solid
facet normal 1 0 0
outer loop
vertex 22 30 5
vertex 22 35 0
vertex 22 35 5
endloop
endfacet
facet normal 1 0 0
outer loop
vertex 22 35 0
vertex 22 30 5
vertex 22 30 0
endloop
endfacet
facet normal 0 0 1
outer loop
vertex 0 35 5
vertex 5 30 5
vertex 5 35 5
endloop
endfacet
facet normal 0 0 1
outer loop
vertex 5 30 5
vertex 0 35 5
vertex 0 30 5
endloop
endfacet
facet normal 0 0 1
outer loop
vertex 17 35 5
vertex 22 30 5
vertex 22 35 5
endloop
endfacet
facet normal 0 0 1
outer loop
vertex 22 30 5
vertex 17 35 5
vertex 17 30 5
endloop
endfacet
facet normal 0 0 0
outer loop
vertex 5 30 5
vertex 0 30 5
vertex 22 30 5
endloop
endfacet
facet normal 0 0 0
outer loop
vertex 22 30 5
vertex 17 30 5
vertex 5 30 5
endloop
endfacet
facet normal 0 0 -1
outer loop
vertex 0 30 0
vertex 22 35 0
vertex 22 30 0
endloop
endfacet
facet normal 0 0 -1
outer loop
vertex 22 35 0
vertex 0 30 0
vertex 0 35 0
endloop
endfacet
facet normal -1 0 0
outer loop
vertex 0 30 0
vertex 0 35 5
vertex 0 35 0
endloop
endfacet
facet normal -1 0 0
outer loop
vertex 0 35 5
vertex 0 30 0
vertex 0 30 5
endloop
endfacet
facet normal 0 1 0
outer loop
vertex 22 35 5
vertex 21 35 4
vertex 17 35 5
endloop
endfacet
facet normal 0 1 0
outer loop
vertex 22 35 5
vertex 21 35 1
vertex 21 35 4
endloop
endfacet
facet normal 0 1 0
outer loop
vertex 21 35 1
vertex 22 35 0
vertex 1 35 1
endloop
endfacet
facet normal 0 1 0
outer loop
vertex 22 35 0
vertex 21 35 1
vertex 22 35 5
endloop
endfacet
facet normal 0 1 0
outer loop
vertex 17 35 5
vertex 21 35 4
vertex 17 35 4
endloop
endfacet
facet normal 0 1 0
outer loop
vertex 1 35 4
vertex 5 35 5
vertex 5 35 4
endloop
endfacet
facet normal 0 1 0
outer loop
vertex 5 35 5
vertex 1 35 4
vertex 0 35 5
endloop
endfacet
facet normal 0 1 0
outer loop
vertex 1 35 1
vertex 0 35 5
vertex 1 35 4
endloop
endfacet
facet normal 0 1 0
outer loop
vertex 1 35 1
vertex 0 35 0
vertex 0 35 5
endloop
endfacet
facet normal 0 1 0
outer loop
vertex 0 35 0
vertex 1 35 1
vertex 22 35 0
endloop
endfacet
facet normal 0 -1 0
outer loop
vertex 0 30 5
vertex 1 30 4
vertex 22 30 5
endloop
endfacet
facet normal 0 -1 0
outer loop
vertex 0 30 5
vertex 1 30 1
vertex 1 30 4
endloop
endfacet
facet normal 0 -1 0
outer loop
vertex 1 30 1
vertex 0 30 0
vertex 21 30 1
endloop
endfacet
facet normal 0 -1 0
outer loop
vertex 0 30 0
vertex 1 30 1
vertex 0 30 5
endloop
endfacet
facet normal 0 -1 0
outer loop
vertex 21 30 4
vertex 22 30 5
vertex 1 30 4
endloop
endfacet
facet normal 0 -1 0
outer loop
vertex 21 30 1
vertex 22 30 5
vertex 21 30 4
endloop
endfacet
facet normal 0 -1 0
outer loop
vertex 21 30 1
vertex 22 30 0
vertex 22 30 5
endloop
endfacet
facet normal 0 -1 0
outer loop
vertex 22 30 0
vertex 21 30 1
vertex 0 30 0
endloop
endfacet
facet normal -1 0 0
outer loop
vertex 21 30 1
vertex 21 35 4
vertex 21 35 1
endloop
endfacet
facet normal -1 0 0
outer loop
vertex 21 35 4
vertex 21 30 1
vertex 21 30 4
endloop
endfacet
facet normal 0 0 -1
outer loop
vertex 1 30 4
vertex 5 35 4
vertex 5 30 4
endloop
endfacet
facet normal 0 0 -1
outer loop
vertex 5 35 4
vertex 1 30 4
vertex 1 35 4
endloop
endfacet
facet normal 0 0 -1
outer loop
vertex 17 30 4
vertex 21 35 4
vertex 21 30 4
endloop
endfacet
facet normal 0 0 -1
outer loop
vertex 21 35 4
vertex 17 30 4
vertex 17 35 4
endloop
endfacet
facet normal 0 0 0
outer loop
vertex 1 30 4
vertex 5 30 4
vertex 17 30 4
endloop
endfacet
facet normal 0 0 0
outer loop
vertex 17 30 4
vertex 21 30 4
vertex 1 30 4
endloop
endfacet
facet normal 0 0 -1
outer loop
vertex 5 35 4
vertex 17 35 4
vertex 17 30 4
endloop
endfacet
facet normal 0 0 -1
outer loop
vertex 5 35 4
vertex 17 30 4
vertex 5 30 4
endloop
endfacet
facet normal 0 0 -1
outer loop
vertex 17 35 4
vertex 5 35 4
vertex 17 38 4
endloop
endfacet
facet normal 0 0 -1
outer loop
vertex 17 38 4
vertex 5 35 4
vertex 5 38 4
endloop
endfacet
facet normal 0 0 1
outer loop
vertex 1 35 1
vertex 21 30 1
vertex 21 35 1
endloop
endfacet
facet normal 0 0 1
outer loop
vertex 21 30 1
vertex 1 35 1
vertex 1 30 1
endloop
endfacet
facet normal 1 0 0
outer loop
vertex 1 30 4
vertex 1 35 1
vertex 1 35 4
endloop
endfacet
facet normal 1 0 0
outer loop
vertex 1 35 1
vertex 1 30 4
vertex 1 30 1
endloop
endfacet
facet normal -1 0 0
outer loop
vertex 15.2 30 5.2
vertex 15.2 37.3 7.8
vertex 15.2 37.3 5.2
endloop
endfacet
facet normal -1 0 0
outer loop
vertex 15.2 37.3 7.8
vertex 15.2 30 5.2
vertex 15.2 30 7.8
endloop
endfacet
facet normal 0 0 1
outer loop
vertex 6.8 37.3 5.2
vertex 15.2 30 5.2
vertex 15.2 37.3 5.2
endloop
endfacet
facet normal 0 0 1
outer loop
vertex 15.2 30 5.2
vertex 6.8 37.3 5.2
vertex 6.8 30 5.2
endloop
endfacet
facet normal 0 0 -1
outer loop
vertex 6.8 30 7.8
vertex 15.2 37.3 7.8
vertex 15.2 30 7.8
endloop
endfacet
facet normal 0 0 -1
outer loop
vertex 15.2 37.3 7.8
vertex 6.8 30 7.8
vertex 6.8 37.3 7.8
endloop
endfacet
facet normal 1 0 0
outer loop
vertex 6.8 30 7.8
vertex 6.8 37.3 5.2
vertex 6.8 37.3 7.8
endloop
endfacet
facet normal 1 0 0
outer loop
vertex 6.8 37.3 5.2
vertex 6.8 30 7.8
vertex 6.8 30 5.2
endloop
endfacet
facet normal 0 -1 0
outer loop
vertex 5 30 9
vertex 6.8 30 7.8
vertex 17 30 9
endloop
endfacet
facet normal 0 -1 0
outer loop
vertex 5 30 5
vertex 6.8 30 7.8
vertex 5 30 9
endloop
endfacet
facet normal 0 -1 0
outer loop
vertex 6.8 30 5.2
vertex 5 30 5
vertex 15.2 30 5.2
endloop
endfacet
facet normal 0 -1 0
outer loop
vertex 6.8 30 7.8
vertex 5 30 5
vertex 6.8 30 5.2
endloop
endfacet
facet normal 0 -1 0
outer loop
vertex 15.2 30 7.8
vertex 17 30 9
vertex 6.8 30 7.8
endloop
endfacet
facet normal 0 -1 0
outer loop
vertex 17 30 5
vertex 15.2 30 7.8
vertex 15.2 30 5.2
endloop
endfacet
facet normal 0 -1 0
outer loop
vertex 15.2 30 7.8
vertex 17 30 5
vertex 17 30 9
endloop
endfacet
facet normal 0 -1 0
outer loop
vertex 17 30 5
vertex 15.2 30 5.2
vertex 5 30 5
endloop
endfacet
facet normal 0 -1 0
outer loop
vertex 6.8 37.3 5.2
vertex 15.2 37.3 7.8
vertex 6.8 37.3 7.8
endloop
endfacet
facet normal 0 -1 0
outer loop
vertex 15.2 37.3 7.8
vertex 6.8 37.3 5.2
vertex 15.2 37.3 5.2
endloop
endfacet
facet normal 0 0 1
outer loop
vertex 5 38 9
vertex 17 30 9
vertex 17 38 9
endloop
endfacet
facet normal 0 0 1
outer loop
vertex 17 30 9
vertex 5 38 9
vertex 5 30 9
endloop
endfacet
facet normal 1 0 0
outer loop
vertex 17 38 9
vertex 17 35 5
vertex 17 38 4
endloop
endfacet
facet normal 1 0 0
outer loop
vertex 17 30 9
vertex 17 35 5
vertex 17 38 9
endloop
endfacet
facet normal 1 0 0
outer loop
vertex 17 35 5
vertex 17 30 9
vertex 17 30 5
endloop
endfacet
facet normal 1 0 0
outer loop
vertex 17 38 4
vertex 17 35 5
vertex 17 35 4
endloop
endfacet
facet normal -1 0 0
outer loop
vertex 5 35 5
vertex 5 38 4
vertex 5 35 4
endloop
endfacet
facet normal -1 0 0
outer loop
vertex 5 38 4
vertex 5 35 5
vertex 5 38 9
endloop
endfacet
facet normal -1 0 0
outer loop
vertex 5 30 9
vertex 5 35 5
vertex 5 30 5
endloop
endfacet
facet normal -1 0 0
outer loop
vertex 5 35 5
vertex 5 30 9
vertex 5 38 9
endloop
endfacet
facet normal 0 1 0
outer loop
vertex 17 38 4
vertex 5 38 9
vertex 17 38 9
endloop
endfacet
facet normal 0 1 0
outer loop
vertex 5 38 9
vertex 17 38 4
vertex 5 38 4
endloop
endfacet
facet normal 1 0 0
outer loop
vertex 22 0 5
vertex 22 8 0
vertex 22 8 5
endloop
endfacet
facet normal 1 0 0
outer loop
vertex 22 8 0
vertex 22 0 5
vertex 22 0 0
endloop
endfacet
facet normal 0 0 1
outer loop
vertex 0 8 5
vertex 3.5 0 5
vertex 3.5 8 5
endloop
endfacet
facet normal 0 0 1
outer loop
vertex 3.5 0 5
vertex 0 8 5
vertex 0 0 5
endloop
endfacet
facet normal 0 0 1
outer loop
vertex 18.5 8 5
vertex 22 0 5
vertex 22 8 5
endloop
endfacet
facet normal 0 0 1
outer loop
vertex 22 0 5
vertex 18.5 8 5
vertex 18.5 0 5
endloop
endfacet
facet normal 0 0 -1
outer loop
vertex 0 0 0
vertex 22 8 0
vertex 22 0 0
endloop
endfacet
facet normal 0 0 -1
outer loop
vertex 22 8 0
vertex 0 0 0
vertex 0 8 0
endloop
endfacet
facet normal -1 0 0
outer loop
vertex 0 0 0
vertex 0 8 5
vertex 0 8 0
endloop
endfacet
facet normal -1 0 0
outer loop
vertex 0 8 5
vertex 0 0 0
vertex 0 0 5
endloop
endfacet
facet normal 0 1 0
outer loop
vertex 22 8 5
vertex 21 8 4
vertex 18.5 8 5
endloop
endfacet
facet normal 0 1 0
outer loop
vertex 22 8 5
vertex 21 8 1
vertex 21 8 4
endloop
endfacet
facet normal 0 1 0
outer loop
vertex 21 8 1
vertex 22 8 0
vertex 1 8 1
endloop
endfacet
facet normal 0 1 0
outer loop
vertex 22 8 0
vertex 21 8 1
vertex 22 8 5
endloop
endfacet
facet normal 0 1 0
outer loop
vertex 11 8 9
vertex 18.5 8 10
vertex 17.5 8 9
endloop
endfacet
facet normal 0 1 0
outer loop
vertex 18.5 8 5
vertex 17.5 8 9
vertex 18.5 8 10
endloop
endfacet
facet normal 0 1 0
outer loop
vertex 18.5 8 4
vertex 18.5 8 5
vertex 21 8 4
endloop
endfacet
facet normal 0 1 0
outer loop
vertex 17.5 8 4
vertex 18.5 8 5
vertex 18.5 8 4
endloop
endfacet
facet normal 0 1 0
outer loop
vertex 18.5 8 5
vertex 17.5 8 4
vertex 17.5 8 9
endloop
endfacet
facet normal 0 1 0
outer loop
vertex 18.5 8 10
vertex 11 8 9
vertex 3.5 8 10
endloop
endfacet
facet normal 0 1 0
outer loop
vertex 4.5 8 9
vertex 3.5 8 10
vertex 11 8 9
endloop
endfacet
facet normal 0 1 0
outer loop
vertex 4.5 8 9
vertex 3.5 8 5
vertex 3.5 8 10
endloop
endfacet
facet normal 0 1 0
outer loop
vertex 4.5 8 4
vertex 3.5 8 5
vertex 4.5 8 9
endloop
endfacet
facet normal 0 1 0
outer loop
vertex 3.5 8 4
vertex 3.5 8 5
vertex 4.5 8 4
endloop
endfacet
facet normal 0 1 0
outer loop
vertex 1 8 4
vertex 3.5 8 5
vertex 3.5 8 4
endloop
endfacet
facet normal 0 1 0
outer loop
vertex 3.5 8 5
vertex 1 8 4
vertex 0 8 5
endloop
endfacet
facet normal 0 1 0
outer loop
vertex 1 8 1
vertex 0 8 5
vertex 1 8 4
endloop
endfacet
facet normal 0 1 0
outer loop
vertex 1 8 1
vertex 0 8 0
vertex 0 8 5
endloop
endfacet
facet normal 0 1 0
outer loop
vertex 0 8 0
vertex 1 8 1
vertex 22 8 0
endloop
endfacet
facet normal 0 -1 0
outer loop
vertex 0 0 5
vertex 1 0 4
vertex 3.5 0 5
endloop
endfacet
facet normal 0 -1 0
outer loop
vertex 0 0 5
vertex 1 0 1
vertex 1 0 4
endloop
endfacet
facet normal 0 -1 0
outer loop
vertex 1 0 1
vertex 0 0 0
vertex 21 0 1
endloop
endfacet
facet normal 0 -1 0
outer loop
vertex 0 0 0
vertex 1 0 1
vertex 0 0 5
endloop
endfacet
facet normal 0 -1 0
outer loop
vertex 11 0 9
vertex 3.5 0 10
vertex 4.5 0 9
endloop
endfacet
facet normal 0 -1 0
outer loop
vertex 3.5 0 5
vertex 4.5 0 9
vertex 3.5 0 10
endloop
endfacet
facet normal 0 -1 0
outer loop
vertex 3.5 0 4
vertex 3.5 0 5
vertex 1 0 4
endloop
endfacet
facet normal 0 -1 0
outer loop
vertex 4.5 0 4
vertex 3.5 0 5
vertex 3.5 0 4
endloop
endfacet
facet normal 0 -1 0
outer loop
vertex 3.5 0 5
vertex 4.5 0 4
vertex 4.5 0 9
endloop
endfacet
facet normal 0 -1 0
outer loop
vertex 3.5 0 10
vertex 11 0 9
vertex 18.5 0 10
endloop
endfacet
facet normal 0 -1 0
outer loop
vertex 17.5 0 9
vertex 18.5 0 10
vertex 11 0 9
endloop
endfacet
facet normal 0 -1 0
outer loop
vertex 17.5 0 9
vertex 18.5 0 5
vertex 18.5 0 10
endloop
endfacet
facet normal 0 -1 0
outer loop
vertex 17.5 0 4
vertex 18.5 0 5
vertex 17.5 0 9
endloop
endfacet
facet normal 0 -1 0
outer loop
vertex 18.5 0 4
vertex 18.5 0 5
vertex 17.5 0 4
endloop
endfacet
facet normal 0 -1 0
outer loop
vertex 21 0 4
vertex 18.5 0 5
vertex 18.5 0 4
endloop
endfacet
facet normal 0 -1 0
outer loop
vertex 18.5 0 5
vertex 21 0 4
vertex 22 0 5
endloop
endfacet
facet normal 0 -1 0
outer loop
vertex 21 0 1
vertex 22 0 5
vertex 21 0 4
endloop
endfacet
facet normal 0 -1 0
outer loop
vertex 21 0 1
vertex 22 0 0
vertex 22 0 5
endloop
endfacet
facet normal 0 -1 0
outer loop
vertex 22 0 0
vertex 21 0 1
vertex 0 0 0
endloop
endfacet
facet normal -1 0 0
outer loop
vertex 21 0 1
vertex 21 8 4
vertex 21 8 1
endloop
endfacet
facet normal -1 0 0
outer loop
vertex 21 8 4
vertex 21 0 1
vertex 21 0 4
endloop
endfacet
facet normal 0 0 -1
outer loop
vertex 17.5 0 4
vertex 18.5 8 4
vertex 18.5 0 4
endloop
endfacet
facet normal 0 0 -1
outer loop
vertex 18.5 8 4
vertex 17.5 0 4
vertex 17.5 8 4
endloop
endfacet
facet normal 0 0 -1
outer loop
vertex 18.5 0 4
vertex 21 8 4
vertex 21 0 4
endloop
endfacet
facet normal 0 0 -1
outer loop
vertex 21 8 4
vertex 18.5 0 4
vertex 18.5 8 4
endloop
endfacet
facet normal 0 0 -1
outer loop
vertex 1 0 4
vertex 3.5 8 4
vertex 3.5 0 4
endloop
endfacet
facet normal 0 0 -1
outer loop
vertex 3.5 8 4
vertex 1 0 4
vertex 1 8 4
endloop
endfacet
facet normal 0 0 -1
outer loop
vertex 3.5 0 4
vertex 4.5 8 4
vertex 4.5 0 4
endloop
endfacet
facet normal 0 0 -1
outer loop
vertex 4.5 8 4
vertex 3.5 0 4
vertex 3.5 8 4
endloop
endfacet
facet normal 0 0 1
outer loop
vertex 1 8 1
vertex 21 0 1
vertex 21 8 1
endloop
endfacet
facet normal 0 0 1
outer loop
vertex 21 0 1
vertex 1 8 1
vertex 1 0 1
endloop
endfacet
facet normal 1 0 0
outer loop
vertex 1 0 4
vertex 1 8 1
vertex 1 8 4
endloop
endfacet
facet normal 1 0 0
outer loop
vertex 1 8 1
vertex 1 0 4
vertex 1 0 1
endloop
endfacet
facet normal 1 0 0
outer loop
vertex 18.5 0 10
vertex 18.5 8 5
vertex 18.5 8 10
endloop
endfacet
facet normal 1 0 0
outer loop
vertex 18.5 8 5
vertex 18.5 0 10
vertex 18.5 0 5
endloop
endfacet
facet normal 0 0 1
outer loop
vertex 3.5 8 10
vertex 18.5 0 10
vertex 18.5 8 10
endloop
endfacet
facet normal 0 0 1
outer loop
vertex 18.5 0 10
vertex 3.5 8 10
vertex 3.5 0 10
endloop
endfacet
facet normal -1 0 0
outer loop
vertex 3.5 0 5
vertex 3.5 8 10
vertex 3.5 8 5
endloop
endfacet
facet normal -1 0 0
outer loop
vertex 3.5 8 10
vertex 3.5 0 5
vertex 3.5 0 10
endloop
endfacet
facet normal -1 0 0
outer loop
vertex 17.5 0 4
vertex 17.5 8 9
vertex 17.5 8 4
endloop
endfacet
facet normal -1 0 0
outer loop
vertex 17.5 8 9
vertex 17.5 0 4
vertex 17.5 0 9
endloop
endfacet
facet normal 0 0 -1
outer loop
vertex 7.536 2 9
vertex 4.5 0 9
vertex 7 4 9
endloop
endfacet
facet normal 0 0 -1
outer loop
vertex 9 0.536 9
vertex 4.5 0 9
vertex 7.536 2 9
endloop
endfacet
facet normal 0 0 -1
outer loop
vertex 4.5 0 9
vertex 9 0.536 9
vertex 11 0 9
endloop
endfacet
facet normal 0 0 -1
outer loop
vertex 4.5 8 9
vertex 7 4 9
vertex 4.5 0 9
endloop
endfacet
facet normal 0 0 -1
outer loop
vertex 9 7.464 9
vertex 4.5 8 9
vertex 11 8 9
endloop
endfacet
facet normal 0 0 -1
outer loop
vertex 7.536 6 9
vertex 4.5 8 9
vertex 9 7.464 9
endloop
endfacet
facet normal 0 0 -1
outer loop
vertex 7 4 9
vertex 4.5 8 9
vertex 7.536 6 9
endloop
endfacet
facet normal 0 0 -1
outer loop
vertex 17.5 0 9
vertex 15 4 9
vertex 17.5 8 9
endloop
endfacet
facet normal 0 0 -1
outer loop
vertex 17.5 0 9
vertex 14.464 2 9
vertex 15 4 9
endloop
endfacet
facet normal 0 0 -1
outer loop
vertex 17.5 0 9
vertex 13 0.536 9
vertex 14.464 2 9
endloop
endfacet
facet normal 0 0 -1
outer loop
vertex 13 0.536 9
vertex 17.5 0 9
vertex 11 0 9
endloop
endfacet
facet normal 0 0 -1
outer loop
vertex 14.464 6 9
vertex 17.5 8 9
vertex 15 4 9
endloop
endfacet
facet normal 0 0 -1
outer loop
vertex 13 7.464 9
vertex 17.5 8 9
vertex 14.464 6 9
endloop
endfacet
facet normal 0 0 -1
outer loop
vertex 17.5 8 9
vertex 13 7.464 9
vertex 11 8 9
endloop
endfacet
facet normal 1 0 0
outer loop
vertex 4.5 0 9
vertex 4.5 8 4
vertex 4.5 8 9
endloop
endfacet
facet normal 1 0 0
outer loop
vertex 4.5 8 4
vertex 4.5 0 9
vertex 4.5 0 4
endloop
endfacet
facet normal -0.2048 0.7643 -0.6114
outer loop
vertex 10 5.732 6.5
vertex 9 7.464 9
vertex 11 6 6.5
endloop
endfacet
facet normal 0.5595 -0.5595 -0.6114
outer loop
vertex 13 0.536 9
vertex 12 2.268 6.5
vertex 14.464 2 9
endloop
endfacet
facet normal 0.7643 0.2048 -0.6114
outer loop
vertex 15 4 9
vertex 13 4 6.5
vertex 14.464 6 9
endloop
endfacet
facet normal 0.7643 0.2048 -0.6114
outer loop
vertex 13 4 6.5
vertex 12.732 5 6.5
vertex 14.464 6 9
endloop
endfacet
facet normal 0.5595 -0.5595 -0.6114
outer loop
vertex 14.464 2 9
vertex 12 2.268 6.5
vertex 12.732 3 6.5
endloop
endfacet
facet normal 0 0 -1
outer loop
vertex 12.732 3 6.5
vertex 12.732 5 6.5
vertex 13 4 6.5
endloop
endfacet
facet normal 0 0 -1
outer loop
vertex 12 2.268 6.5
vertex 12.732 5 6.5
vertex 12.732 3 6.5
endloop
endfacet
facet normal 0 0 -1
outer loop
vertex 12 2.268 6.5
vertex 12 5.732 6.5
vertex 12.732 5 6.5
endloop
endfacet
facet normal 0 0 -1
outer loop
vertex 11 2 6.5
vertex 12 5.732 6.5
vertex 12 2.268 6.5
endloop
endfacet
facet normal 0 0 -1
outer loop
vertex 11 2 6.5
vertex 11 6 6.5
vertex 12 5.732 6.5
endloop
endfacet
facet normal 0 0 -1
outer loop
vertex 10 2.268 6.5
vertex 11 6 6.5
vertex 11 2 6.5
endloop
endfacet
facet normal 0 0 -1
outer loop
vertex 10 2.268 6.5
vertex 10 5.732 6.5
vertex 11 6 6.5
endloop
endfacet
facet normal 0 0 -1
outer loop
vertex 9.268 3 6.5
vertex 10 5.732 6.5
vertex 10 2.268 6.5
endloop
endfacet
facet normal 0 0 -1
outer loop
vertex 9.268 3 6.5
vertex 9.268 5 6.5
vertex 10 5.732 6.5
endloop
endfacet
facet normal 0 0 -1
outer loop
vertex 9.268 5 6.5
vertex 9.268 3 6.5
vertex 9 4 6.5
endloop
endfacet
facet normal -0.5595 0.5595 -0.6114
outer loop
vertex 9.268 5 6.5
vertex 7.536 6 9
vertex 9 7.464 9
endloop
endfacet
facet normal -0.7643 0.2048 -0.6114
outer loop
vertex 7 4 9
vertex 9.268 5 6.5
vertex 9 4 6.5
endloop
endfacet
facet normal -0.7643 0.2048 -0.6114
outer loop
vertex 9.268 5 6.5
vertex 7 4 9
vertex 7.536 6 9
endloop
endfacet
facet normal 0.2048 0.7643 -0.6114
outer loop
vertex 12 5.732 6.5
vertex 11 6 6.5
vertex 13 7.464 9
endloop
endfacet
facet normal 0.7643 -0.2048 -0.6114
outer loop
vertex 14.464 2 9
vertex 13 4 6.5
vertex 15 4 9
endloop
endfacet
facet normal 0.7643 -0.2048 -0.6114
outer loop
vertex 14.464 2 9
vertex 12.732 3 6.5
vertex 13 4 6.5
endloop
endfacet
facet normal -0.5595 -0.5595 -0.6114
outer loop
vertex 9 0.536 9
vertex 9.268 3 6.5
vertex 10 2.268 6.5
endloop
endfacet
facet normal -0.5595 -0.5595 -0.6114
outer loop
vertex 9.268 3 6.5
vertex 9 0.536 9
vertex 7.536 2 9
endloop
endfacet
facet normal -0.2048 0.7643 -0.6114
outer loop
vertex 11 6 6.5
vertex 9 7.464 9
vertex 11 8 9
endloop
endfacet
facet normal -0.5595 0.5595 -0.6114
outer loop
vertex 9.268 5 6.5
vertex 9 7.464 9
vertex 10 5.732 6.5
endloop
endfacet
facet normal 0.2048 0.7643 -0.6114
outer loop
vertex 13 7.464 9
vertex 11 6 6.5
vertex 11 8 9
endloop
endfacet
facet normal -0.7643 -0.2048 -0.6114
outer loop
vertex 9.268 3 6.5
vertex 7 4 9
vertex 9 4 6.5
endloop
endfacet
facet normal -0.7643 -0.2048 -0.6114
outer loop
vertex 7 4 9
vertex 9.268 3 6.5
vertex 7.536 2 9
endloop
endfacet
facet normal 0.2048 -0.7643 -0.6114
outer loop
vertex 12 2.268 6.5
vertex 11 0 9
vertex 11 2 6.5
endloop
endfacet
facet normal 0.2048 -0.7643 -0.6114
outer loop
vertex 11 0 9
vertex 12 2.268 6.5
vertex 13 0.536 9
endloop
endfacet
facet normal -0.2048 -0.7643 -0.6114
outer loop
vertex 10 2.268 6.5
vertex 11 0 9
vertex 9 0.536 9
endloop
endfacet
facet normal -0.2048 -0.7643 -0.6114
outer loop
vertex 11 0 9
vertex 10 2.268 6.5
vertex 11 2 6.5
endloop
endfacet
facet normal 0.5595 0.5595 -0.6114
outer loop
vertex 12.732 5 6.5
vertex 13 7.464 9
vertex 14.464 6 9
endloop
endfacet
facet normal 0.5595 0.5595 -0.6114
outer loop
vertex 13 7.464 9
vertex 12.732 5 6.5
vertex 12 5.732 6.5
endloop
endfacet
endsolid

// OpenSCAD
//ykc 5mm deep, 12/13mm wide 
// strap, 3x20mm
$fn=12;
// watch strap
STRAP_WIDTH = 20;
STRAP_DEPTH = 3;

// USB metal part of YKNano
USB_WIDTH = 8.4;
USB_HEIGHT = 2.6;
USB_DEPTH = 7.3;
USB_DIMS = [USB_WIDTH, USB_DEPTH, USB_HEIGHT];
// plastic black part of YKNano
YKN_WIDTH = 13;
YKN_DEPTH = 22;
YKN_HEIGHT = 5;
YKN_DIMS = [YKN_WIDTH, YKN_DEPTH, YKN_HEIGHT];

// CAP = USB cap recepticle
CAP_HEIGHT = 6;
CAP_WIDTH = 12;

// mount band that goes round strap
MOUNT_DEPTH = 1;
MOUNT_LENGTH = 5;
MOUNT_WIDTH = STRAP_WIDTH + 2 * MOUNT_DEPTH;

// hole strap, strap/mount bit with hole fixing
HS_WIDTH = YKN_WIDTH+(2*MOUNT_DEPTH);
HS_LENGTH = 8;

module yubikeynano() {
    // body offset to position USB bit in centre of YKN bit
    body_offset = [(YKN_DIMS[0] - USB_DIMS[0])/2, 0, (YKN_DIMS[2] - USB_DIMS[2])/2];
    translate(body_offset)
        cube(USB_DIMS);
    translate([0,USB_DEPTH,0])
        cube(YKN_DIMS);
}

module cap(){
    difference(){
        cube([CAP_WIDTH,8,YKN_HEIGHT]);
        translate([((CAP_WIDTH-YKN_WIDTH)/2),USB_DEPTH,5])
            rotate(a=[180,0,0])
                yubikeynano();
    }
}

module strap(){
    cube([STRAP_WIDTH,70,STRAP_DEPTH]);
}

module mount(len){
   difference(){
        cube([STRAP_WIDTH+2*MOUNT_DEPTH,len,STRAP_DEPTH+2*MOUNT_DEPTH]);
       translate([MOUNT_DEPTH,0,MOUNT_DEPTH])
        strap();
    }
}

module cap_strap(){
    union(){
        mount(MOUNT_LENGTH);
        translate([((STRAP_WIDTH+(2*MOUNT_DEPTH))-CAP_WIDTH)/2,0,MOUNT_DEPTH + STRAP_DEPTH])
            cap();
    }
}

// strap which wraps around watchband, with USB-c cap
module hole_strap(){

    difference(){
        union(){
            mount(HS_LENGTH);
            translate([(MOUNT_WIDTH - HS_WIDTH)/2,0,STRAP_DEPTH + MOUNT_DEPTH])
                cube([HS_WIDTH,HS_LENGTH,YKN_HEIGHT+MOUNT_DEPTH]);
        }
        translate([((MOUNT_WIDTH-YKN_WIDTH)/2), -15,STRAP_DEPTH + MOUNT_DEPTH])
            yubikeynano();
    }

    translate([MOUNT_WIDTH/2,HS_LENGTH/2,(YKN_HEIGHT/2)+STRAP_DEPTH+MOUNT_DEPTH])
        hole_template();
}
module hole_template(){
    cylinder(r2=4, r1=2,h=YKN_HEIGHT/2);
    //cylinder(r=3,h=1);
}
/*
rotate([180,0,0]) translate([0,0,(-YKN_HEIGHT)+0])
    yubikeynano();*/
translate([0,30,0])
    cap_strap();

hole_strap();
//cap();
